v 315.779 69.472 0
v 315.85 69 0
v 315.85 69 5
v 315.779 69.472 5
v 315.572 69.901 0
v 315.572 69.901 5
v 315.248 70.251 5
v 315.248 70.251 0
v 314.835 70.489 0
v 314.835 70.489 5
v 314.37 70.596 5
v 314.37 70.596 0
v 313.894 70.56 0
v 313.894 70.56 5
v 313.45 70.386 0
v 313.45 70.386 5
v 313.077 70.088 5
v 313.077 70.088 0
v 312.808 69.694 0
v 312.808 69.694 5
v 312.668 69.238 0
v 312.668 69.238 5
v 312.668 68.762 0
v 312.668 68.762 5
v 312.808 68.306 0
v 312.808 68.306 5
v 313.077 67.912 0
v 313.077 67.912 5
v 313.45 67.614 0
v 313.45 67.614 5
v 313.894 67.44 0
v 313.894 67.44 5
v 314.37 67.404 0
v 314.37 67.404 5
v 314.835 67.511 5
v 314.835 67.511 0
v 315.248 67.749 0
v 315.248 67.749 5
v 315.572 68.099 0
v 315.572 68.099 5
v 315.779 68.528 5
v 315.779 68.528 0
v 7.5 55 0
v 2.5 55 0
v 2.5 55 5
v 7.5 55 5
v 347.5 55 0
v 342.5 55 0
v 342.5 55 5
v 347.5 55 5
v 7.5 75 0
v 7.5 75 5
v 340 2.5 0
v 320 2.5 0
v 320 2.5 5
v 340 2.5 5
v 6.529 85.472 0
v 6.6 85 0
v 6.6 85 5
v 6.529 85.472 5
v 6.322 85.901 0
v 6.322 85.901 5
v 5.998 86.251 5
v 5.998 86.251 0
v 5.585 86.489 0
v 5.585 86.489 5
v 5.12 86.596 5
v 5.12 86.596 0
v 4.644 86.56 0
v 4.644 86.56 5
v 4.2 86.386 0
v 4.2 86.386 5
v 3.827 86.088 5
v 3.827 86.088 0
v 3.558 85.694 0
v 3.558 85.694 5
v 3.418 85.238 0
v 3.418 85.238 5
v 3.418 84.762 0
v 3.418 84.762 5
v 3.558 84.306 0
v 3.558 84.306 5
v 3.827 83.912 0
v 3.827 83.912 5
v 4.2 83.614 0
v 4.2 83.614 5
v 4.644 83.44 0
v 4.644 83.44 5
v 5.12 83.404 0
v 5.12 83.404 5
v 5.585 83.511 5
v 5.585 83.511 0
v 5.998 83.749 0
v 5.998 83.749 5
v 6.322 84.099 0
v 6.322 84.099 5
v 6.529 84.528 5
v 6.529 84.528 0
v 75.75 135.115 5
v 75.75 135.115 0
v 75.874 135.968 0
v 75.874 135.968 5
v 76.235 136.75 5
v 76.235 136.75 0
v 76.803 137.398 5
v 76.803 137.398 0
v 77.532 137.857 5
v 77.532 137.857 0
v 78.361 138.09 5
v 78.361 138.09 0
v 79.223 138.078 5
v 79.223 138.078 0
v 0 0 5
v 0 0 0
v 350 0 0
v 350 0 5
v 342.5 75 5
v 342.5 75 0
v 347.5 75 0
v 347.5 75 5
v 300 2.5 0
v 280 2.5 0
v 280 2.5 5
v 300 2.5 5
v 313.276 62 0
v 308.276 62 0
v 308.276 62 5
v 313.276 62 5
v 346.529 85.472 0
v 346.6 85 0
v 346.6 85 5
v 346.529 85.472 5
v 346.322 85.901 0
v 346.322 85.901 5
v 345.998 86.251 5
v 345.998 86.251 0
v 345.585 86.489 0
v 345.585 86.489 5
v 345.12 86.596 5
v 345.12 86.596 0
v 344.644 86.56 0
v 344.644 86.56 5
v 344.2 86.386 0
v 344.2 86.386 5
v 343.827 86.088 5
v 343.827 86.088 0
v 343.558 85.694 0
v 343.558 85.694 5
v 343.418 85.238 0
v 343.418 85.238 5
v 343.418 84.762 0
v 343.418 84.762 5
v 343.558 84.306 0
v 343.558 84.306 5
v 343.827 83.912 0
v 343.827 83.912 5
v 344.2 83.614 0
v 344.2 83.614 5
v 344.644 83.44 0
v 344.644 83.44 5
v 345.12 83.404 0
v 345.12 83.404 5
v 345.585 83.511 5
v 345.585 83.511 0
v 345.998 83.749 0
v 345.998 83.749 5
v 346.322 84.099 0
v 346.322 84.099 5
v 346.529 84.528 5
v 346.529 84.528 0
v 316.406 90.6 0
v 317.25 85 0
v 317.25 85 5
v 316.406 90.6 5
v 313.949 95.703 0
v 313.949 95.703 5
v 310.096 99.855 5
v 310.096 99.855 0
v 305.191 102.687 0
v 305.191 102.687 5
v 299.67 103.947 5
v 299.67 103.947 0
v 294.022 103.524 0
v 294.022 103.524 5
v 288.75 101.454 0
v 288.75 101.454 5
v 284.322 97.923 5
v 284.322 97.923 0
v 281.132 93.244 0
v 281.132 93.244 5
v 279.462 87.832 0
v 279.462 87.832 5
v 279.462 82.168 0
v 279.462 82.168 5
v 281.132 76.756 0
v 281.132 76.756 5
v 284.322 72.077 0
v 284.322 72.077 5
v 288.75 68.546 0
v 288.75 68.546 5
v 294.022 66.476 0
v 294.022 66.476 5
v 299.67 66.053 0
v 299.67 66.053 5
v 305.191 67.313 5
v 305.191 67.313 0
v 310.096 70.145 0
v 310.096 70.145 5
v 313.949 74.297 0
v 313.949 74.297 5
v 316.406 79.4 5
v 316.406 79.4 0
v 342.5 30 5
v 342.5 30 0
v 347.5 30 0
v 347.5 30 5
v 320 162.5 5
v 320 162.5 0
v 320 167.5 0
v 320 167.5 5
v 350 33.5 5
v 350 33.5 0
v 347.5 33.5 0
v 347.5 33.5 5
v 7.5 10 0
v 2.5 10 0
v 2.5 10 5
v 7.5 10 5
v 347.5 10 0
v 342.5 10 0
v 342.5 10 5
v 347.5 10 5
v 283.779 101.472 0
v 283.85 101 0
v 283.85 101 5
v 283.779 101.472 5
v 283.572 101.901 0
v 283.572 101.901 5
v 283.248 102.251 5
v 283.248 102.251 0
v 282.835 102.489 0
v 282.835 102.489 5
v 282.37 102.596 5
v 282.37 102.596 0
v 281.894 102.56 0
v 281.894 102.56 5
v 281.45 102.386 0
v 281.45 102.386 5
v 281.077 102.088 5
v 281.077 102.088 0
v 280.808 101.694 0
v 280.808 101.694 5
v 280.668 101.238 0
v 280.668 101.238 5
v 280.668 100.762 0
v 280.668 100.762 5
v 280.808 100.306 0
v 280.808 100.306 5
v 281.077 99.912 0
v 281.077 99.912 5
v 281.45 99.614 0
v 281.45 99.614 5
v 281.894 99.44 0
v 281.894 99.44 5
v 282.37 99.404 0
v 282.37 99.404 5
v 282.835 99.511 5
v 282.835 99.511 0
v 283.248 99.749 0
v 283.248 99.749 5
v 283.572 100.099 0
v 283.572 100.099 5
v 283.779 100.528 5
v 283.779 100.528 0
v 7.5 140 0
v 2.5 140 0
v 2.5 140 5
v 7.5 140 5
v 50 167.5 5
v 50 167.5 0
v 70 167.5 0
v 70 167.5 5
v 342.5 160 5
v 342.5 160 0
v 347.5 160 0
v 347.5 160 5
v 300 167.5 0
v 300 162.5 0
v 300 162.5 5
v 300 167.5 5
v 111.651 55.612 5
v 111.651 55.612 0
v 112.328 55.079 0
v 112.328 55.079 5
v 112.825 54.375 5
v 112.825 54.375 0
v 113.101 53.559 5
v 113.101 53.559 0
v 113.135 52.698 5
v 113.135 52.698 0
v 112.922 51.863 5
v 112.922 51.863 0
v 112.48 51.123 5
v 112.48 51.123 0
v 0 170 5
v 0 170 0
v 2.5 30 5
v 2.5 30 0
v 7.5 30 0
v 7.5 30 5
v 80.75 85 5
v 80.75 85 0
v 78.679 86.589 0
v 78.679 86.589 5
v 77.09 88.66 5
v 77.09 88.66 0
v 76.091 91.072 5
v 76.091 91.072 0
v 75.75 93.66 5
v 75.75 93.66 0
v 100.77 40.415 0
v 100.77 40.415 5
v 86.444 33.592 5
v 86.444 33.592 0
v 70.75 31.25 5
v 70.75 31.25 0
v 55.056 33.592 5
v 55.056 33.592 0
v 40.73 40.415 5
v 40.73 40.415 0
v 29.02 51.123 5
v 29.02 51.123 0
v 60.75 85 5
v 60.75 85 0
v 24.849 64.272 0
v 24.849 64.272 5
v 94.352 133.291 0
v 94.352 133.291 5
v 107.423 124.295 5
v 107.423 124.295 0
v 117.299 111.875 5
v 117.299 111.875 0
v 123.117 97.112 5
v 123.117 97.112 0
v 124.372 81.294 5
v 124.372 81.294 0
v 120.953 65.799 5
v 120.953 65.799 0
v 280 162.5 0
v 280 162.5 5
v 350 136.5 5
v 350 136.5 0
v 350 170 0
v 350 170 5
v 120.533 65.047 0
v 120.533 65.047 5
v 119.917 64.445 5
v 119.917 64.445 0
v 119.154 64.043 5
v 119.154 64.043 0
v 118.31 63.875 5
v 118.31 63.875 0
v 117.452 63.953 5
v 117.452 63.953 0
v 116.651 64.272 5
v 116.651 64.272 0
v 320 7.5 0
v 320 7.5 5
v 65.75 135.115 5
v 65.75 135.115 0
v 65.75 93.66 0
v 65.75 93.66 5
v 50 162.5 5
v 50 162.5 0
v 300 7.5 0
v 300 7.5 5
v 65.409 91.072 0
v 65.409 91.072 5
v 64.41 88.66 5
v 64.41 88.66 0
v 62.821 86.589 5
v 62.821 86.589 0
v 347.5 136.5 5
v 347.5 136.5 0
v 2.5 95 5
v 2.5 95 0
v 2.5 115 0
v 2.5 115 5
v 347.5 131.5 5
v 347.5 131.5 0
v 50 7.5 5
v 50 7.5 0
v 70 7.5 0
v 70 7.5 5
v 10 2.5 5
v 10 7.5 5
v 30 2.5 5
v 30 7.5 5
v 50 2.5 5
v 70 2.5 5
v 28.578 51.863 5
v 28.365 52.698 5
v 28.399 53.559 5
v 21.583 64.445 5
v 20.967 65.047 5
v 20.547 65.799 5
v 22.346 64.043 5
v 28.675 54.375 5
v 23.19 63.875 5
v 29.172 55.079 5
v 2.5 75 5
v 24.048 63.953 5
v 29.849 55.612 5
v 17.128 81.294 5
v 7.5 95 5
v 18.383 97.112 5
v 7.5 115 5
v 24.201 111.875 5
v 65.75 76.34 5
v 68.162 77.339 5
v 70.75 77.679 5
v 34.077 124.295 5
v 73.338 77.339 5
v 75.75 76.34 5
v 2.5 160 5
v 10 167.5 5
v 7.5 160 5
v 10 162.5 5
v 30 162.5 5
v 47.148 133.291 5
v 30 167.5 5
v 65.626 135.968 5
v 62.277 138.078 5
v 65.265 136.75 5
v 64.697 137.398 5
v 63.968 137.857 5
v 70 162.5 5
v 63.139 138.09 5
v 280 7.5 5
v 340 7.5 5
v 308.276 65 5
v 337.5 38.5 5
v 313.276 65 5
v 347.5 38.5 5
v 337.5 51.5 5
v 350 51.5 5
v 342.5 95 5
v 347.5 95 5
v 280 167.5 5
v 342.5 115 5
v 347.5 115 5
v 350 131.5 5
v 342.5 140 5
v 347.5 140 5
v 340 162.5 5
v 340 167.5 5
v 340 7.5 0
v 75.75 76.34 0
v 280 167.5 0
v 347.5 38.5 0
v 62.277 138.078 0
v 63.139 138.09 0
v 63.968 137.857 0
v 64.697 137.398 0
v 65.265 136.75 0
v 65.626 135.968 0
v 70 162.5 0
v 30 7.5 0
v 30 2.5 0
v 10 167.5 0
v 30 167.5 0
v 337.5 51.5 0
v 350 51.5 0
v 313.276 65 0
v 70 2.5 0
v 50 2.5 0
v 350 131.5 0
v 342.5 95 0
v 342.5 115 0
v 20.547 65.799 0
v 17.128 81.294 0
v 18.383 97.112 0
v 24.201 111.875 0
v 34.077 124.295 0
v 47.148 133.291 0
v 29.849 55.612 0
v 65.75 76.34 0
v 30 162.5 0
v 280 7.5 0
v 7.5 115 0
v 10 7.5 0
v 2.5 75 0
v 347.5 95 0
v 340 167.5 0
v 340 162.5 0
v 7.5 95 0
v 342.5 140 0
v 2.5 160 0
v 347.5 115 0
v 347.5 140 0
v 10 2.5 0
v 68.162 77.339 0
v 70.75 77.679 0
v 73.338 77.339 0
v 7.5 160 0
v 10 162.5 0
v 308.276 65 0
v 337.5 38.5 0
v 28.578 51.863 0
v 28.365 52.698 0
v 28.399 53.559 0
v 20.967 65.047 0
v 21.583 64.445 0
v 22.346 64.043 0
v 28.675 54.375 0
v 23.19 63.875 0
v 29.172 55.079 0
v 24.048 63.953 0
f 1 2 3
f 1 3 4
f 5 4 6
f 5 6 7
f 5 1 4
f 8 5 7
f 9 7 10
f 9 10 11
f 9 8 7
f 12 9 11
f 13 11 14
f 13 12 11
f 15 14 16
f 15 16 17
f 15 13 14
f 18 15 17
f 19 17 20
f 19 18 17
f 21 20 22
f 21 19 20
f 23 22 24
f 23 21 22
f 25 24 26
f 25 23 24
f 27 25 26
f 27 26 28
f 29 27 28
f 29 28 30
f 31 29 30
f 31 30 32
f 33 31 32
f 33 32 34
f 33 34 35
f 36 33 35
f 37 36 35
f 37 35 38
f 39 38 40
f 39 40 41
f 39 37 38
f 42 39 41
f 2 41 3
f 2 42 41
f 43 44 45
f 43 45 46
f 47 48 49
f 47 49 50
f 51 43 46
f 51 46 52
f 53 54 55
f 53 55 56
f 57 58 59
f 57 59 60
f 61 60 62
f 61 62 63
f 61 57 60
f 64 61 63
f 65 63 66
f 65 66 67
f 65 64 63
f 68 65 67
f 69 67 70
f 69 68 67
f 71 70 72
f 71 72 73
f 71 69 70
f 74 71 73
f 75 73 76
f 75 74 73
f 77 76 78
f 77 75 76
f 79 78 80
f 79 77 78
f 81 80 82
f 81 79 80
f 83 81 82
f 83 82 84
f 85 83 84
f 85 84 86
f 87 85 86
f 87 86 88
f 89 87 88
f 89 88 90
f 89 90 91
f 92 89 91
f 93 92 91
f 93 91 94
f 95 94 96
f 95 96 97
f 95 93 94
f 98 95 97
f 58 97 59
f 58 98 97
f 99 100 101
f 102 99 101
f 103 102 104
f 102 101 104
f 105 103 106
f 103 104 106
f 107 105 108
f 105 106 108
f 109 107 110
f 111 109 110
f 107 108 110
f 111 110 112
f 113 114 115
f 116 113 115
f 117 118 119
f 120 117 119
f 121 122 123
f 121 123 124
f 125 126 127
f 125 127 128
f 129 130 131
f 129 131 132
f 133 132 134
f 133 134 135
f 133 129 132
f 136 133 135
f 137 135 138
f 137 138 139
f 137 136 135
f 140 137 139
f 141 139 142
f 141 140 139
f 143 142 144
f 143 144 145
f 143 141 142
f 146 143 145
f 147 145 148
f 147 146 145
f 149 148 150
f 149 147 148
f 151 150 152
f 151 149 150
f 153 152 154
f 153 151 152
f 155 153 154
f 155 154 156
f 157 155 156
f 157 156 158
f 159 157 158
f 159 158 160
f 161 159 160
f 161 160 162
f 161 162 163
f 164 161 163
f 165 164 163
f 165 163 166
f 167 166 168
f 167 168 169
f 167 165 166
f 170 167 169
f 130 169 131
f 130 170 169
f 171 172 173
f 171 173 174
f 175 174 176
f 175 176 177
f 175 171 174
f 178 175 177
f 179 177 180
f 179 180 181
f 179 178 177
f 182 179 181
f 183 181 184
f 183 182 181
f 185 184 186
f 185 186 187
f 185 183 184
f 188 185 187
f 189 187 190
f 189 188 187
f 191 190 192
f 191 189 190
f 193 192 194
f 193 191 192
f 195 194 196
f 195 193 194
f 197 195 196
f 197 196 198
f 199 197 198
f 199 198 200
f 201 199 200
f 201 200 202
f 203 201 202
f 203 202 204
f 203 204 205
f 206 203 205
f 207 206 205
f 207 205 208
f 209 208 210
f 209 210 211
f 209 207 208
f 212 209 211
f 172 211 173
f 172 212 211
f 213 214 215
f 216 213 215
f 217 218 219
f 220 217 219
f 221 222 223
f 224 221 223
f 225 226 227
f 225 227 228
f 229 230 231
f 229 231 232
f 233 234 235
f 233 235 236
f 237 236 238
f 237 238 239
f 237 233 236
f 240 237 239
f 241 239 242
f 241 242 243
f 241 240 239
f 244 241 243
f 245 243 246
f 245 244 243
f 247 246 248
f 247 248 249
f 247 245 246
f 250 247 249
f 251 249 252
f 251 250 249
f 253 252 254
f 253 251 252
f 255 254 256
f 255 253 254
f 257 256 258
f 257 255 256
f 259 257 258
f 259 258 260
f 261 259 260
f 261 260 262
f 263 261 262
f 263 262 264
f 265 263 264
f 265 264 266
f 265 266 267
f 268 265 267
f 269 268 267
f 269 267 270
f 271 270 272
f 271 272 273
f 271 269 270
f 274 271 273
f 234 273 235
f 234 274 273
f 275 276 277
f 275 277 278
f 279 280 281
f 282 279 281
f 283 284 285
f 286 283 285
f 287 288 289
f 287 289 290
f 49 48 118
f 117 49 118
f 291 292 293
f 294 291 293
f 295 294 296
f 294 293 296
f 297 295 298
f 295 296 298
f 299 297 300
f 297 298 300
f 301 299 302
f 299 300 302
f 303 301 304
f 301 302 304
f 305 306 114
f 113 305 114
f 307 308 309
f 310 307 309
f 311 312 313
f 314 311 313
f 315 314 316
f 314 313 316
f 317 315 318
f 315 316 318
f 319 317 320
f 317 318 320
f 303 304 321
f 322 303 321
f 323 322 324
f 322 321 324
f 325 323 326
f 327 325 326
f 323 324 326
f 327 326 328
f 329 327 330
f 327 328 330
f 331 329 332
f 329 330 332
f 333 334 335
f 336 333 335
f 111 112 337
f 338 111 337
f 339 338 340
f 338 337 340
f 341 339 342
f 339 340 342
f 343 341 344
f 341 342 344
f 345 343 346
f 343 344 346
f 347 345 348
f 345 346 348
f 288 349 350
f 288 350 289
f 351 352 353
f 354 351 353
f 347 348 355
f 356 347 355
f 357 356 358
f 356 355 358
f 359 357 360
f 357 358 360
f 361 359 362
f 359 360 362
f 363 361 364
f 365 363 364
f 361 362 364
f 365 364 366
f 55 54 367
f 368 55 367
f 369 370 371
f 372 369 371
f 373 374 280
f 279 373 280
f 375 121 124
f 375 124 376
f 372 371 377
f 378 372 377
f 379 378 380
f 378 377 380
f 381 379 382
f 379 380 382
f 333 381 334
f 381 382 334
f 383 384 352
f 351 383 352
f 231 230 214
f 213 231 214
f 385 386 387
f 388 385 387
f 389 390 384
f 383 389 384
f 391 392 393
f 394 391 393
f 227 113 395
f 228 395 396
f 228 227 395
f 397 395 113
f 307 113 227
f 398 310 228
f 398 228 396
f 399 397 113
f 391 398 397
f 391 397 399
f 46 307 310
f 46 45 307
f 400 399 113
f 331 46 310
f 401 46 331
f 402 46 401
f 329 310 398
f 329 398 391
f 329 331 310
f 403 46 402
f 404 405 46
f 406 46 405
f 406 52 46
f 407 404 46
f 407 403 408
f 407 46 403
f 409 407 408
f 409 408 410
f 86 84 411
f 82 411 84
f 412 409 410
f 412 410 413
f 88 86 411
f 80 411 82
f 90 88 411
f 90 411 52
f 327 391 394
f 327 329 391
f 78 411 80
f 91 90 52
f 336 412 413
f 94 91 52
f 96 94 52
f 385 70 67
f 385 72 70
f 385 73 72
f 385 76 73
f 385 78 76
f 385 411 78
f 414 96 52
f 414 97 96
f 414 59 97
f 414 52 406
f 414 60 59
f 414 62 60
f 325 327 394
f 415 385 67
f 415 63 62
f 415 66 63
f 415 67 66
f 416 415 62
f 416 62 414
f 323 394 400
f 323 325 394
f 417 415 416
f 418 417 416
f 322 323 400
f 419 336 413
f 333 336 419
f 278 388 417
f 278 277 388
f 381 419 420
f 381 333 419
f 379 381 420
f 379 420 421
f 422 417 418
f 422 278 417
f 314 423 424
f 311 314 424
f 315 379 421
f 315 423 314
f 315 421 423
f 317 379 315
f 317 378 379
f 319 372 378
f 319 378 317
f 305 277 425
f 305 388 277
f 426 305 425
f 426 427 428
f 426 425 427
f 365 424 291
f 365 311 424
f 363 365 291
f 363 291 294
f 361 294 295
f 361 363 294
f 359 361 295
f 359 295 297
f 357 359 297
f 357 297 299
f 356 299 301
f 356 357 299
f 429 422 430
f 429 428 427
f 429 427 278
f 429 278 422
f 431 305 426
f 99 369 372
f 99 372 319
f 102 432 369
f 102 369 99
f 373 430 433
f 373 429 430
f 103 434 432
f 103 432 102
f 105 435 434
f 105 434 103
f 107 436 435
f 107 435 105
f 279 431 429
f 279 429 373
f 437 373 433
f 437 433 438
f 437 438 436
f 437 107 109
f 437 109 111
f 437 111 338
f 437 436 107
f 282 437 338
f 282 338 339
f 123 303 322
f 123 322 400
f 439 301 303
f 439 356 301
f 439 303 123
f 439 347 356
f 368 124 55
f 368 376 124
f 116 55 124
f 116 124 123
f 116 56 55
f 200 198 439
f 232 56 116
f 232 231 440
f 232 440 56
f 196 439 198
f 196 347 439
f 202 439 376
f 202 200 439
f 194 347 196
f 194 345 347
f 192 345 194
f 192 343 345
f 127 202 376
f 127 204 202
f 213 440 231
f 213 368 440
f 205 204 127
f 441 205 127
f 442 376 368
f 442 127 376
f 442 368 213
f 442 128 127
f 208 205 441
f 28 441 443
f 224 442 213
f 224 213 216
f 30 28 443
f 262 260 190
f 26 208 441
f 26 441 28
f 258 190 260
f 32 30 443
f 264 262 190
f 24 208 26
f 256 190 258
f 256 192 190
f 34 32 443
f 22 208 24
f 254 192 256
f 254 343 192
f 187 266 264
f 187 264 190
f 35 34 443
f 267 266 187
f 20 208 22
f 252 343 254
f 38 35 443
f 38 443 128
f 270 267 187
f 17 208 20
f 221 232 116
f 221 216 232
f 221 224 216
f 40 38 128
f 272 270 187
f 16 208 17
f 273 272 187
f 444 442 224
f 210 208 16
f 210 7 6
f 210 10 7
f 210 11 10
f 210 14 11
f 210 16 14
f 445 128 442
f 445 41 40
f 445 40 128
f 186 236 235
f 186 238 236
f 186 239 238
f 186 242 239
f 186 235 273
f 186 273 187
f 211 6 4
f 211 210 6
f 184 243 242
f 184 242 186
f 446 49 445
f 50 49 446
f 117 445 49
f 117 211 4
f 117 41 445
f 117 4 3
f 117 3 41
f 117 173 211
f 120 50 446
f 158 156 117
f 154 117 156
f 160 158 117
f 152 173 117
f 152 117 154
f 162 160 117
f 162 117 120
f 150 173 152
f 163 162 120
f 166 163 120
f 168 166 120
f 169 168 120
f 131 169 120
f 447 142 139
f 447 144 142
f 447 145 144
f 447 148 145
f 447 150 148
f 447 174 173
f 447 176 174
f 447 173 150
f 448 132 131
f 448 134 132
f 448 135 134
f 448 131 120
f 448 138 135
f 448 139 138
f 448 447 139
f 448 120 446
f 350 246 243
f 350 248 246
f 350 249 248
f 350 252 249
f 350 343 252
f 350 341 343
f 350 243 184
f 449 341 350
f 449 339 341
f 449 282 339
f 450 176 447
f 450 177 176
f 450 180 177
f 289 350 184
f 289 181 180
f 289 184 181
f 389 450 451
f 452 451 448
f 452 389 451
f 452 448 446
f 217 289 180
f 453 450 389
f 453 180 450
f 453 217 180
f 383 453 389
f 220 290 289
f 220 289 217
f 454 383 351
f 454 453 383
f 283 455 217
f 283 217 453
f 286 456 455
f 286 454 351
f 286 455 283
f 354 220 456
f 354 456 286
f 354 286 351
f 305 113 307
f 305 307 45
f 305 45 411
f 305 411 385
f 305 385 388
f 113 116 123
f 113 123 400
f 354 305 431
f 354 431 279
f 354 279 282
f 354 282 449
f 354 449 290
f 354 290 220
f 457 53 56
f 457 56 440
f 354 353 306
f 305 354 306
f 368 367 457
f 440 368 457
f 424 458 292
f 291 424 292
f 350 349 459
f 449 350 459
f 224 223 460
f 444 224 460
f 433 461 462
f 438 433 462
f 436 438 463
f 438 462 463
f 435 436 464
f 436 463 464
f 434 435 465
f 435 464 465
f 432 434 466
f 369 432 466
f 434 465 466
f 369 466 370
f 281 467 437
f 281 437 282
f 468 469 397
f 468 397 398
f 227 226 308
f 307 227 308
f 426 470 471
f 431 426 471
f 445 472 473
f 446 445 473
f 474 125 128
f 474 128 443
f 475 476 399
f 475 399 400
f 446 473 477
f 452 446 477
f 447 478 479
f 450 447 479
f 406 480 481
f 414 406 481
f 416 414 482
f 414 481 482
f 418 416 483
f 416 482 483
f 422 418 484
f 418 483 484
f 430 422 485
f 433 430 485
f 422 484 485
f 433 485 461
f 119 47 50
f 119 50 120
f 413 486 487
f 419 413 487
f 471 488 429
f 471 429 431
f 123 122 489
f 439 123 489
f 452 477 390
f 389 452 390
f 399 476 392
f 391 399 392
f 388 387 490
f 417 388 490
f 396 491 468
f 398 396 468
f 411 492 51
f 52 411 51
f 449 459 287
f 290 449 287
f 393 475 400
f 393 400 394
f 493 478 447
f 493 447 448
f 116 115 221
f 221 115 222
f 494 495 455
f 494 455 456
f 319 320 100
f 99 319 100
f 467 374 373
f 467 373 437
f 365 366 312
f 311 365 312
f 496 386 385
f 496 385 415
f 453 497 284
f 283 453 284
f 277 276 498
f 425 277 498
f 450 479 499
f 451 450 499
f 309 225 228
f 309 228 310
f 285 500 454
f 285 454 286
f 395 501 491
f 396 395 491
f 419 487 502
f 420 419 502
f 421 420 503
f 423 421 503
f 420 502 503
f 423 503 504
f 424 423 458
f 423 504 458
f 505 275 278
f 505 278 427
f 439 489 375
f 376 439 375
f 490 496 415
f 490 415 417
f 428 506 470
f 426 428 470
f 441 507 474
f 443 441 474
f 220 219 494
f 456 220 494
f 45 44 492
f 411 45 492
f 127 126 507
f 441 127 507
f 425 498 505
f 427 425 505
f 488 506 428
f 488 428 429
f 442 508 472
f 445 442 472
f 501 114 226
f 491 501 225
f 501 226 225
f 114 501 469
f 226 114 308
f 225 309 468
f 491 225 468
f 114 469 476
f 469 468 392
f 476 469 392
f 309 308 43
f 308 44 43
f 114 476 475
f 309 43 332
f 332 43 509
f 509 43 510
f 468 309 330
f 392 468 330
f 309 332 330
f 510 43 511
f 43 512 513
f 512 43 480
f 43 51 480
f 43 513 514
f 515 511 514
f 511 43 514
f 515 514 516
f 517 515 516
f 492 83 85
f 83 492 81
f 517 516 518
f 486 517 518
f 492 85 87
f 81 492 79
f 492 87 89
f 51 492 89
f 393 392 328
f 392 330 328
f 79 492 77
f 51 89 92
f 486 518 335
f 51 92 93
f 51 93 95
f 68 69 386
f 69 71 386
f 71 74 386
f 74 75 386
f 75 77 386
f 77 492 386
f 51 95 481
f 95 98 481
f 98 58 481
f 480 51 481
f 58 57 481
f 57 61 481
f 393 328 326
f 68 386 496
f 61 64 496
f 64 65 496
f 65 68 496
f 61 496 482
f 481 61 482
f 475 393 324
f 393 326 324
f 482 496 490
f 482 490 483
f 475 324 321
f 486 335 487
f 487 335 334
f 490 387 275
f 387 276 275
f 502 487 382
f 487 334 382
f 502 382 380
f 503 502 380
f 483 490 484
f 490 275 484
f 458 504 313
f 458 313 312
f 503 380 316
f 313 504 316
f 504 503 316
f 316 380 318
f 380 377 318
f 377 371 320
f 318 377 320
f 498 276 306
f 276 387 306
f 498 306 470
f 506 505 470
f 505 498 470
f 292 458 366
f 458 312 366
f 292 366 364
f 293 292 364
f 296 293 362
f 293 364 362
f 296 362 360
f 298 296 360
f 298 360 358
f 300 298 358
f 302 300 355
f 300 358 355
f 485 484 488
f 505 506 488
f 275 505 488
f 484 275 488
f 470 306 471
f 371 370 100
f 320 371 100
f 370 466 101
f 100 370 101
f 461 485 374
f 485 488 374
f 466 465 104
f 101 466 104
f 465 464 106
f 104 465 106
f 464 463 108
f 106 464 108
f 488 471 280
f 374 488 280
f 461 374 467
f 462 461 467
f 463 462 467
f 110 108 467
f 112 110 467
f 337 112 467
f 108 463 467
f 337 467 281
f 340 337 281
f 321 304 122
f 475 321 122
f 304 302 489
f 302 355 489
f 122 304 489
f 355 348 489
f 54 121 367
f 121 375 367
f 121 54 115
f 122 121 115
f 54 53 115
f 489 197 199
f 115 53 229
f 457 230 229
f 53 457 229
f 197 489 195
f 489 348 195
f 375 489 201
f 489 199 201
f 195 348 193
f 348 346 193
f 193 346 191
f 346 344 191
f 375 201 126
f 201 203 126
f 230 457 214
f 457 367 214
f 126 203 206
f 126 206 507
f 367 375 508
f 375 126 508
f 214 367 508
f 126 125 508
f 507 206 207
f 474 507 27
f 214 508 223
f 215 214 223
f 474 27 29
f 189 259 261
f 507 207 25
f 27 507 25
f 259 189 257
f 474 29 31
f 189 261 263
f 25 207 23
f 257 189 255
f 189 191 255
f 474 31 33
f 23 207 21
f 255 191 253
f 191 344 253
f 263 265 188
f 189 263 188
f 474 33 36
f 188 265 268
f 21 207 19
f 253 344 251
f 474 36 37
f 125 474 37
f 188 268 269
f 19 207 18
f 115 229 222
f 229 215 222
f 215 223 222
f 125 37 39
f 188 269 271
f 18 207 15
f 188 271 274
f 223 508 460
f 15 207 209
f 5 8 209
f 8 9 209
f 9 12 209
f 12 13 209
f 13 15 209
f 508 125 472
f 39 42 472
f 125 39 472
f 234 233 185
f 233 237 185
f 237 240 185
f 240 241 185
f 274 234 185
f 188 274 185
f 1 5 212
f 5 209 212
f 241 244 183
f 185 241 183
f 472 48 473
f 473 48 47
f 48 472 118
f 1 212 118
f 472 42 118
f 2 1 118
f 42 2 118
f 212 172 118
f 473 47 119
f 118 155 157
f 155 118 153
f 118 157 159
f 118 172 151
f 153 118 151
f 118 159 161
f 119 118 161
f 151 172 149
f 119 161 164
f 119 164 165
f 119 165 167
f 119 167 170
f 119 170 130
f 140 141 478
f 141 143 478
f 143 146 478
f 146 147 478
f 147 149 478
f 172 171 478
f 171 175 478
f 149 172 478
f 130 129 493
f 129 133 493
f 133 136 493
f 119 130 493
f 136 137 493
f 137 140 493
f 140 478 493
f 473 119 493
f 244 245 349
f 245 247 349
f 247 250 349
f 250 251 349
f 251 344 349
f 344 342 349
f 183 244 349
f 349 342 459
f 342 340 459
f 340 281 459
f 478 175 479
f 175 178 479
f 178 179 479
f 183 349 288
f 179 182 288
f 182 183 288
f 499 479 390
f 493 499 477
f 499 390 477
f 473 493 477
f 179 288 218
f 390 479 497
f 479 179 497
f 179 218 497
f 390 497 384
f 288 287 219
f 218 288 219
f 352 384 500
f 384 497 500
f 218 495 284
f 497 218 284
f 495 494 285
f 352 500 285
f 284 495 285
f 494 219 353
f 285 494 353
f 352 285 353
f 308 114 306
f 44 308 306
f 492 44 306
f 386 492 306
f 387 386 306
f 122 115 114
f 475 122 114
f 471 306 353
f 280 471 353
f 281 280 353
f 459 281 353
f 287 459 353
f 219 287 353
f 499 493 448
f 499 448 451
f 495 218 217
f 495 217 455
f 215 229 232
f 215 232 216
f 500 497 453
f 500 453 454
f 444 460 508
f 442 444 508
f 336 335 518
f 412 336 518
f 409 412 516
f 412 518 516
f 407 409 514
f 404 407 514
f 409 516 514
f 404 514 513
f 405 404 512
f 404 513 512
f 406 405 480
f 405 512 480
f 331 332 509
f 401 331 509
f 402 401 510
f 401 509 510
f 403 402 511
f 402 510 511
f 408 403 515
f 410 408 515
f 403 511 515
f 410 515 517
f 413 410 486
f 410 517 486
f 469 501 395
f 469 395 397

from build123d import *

# Parameters (mm, degrees)
F1_W     = 20
F1_H     = 5
F1_W_2   = 5
F1_H_2   = 20
F1_H_3   = 3
F1_R     = 1.6
F1_R_2   = 19
F2_DEPTH = 5


with BuildPart() as f2:
    # F1 (on Top) → F2 (new body)
    with BuildSketch(Plane.XY):
        Polygon((0, 170), (0, 0), (350, 0), (350, 33.5), (347.5, 33.5), (347.5, 38.5), (337.5, 38.5), (337.5, 51.5), (350, 51.5), (350, 131.5), (347.5, 131.5), (347.5, 136.5), (350, 136.5), (350, 170), align=None)
        with Locations((20, 5)):
            Rectangle(F1_W, F1_H, mode=Mode.SUBTRACT)
        with Locations((5, 20)):
            Rectangle(F1_W_2, F1_H_2, mode=Mode.SUBTRACT)
        with Locations((60, 5)):
            Rectangle(F1_W, F1_H, mode=Mode.SUBTRACT)
        with BuildLine():
            ThreePointArc((112.4804290917, 51.1232559442), (70.75, 31.25), (29.0195709083, 51.1232559442))
            ThreePointArc((29.0195709083, 51.1232559442), (28.3986145368, 53.5589638456), (29.8487111366, 55.6121271726))
            Line((29.8487111366, 55.6121271726), (65.75, 76.3397459622))
            ThreePointArc((65.75, 76.3397459622), (70.75, 77.6794919243), (75.75, 76.3397459622))
            Line((75.75, 76.3397459622), (111.6512888634, 55.6121271726))
            ThreePointArc((111.6512888634, 55.6121271726), (113.1013854632, 53.5589638456), (112.4804290917, 51.1232559442))
        make_face(mode=Mode.SUBTRACT)
        with Locations((5, 65)):
            Rectangle(F1_W_2, F1_H_2, mode=Mode.SUBTRACT)
        with Locations((290, 5)):
            Rectangle(F1_W, F1_H, mode=Mode.SUBTRACT)
        with Locations((330, 5)):
            Rectangle(F1_W, F1_H, mode=Mode.SUBTRACT)
        with Locations((345, 20)):
            Rectangle(F1_W_2, F1_H_2, mode=Mode.SUBTRACT)
        with Locations((310.775873661, 63.5)):
            Rectangle(F1_W_2, F1_H_3, mode=Mode.SUBTRACT)
        with Locations((314.25, 69)):
            Circle(F1_R, mode=Mode.SUBTRACT)
        with Locations((345, 65)):
            Rectangle(F1_W_2, F1_H_2, mode=Mode.SUBTRACT)
        with Locations((5, 85)):
            Circle(F1_R, mode=Mode.SUBTRACT)
        with Locations((5, 105)):
            Rectangle(F1_W_2, F1_H_2, mode=Mode.SUBTRACT)
        with BuildLine():
            Line((65.75, 135.1154916169), (65.75, 93.6602540378))
            ThreePointArc((65.75, 93.6602540378), (64.4102540378, 88.6602540378), (60.75, 85))
            Line((60.75, 85), (24.8487111366, 64.2723812105))
            ThreePointArc((24.8487111366, 64.2723812105), (22.3455712374, 64.0431423806), (20.5466645043, 65.7987603236))
            ThreePointArc((20.5466645043, 65.7987603236), (24.2011345466, 111.875), (62.2770935961, 138.0779837321))
            ThreePointArc((62.2770935961, 138.0779837321), (64.6969567006, 137.3978937738), (65.75, 135.1154916169))
        make_face(mode=Mode.SUBTRACT)
        with BuildLine():
            ThreePointArc((80.75, 85), (77.0897459622, 88.6602540378), (75.75, 93.6602540378))
            Line((75.75, 93.6602540378), (75.75, 135.1154916169))
            ThreePointArc((75.75, 135.1154916169), (76.8030432994, 137.3978937738), (79.2229064039, 138.0779837321))
            ThreePointArc((79.2229064039, 138.0779837321), (117.2988654534, 111.875), (120.9533354957, 65.7987603236))
            ThreePointArc((120.9533354957, 65.7987603236), (119.1544287626, 64.0431423806), (116.6512888634, 64.2723812105))
            Line((116.6512888634, 64.2723812105), (80.75, 85))
        make_face(mode=Mode.SUBTRACT)
        with Locations((5, 150)):
            Rectangle(F1_W_2, F1_H_2, mode=Mode.SUBTRACT)
        with Locations((20, 165)):
            Rectangle(F1_W, F1_H, mode=Mode.SUBTRACT)
        with Locations((60, 165)):
            Rectangle(F1_W, F1_H, mode=Mode.SUBTRACT)
        with Locations((298.25, 85)):
            Circle(F1_R_2, mode=Mode.SUBTRACT)
        with Locations((282.25, 101)):
            Circle(F1_R, mode=Mode.SUBTRACT)
        with Locations((345, 85)):
            Circle(F1_R, mode=Mode.SUBTRACT)
        with Locations((345, 105)):
            Rectangle(F1_W_2, F1_H_2, mode=Mode.SUBTRACT)
        with Locations((290, 165)):
            Rectangle(F1_W, F1_H, mode=Mode.SUBTRACT)
        with Locations((345, 150)):
            Rectangle(F1_W_2, F1_H_2, mode=Mode.SUBTRACT)
        with Locations((330, 165)):
            Rectangle(F1_W, F1_H, mode=Mode.SUBTRACT)
    extrude(amount=F2_DEPTH)


solid = f2.part
